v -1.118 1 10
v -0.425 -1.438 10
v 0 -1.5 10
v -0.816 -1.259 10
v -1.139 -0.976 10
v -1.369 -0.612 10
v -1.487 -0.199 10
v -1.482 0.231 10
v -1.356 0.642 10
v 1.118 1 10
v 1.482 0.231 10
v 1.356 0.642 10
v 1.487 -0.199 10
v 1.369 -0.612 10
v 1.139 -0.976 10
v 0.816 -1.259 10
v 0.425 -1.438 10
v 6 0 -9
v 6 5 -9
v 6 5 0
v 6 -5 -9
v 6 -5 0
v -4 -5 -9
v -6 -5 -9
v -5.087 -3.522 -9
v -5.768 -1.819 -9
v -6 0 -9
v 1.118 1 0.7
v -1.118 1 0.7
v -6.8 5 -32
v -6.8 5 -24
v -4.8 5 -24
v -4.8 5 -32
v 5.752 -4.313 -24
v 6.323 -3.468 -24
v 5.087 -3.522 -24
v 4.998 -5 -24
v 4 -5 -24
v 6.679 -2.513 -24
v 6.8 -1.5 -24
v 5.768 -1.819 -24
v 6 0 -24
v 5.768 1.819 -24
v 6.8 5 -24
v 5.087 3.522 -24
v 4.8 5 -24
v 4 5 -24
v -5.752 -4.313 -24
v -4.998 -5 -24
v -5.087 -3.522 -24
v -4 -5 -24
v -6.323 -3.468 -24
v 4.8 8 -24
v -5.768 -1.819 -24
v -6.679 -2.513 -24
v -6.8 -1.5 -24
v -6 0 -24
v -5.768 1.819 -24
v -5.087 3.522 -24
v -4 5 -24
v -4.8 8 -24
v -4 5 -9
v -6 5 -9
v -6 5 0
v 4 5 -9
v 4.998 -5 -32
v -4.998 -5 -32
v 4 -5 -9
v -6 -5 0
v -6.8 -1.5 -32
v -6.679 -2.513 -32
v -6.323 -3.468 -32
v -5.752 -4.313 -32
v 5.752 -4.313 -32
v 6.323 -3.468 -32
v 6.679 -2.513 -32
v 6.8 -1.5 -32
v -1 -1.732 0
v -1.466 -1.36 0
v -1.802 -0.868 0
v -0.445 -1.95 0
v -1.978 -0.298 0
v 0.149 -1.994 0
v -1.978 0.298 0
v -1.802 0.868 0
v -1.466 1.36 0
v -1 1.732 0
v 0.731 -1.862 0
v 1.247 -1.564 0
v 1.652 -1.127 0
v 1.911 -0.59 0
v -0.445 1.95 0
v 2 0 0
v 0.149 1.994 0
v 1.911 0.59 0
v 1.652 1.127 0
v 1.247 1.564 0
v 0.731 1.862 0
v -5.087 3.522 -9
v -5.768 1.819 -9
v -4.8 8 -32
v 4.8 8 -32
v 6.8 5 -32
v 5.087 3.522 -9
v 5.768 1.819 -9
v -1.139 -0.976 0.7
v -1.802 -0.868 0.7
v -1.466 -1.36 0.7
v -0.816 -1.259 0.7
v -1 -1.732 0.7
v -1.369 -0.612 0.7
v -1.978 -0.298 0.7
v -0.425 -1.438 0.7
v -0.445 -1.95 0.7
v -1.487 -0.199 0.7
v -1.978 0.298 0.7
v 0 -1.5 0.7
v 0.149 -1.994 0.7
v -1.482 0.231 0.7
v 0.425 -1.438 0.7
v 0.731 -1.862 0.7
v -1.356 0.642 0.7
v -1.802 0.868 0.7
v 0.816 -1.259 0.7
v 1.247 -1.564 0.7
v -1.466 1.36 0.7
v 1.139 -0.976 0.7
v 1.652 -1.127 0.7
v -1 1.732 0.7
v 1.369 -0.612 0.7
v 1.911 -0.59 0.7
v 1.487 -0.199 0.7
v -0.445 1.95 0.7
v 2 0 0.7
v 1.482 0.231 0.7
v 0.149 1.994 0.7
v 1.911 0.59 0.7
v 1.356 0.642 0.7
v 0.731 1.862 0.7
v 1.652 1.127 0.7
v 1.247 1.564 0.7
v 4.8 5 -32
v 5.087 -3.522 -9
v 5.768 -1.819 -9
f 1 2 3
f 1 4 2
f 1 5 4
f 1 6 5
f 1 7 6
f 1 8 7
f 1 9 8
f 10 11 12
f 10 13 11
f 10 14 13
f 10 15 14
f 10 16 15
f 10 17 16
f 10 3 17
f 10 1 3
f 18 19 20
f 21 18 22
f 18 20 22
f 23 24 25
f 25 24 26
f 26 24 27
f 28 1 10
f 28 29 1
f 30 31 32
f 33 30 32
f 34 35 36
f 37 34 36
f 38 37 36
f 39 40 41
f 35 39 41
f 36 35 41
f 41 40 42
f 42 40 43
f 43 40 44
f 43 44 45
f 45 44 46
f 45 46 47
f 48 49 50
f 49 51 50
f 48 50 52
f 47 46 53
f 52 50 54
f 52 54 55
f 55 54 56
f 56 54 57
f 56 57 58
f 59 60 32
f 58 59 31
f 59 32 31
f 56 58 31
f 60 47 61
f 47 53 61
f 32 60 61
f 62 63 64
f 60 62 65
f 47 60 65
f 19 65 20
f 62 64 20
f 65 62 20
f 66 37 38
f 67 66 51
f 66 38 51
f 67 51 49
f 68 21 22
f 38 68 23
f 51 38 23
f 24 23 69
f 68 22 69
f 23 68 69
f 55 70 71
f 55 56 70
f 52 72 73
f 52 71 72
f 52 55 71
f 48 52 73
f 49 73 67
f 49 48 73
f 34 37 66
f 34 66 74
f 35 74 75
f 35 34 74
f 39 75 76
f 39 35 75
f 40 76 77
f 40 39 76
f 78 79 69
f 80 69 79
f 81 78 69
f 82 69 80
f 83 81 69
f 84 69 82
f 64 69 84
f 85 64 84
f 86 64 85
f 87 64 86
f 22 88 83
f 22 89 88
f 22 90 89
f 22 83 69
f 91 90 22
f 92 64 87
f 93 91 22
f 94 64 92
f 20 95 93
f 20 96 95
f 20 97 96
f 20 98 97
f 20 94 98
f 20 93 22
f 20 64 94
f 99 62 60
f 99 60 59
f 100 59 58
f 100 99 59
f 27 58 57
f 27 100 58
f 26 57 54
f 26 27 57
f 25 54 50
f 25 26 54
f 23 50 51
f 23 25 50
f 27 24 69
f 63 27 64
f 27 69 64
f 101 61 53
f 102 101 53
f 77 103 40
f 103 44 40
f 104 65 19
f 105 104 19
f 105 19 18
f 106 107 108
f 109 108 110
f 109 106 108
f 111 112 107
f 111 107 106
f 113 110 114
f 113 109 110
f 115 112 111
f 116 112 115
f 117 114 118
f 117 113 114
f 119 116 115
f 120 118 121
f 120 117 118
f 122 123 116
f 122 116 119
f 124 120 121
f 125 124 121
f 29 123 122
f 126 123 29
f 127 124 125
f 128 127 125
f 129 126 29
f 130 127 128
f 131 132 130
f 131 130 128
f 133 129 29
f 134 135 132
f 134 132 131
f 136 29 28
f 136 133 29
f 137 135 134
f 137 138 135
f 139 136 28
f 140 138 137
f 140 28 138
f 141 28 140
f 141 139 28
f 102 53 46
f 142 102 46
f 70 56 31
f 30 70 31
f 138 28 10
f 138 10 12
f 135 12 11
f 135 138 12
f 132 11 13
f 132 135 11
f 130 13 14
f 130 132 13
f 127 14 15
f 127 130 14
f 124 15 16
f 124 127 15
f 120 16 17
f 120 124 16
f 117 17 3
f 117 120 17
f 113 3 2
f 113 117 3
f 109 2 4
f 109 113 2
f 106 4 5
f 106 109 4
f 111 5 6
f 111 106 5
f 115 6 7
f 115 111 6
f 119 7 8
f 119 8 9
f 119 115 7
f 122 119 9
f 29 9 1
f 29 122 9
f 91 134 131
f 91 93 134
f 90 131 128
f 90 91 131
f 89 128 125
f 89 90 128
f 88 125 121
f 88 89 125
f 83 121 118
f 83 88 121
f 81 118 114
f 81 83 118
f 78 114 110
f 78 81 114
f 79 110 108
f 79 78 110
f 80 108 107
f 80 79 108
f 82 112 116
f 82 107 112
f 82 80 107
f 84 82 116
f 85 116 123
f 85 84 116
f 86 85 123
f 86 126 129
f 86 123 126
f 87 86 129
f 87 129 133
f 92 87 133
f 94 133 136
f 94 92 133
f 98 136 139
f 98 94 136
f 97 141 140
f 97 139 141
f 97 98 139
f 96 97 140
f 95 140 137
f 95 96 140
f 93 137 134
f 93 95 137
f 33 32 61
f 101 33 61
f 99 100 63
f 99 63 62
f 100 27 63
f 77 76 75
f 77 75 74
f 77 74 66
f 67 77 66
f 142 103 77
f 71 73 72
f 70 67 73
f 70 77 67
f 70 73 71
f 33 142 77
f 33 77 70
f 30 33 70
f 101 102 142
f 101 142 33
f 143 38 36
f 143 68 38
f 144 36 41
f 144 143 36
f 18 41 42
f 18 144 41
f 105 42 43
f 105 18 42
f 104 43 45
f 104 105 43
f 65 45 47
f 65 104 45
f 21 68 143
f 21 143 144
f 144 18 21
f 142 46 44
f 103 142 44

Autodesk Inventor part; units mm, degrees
ref_plane "YZ Plane" through (0, 0, 0) normal (1, 0, 0) x (0, 1, 0)
ref_plane "XZ Plane" through (0, 0, 0) normal (0, 1, 0) x (-1, 0, 0)
ref_plane "XY Plane" through (0, 0, 0) normal (0, 0, 1) x (1, 0, 0)
sketch "スケッチ1" plane through (0, 0, 0) normal (0, 0, 1) x (1, 0, 0)
  line L0 (-6, 5) -> (6, 5)
  line L1 (6, 5) -> (6, -5)
  line L2 (6, -5) -> (-6, -5)
  line L3 (-6, -5) -> (-6, 5)
  point P0 (0, 0)
  point P1 (0, -5)
  point P2 (6, 0)
  dimension "d0" = 12
  dimension "d1" = 10
extrude "ギヤボックス" add sketch "スケッチ1" against normal blind 9
sketch "スケッチ2" plane through (0, 0, 0) normal (0, 0, 1) x (1, 0, 0)
  circle A0 centre (0, 0) radius 1.5
  line L0 (-1.118, 1) -> (1.118, 1)
  circle A1 centre (0, 0) radius 2
  dimension "d4" = 3
  dimension "d5" = 1
  dimension "d6" = 4
extrude "軸受け" add sketch "スケッチ2" along normal blind 0.7 contours A0 L0 | L0 A0 | A1
extrude "軸" add sketch "スケッチ2" along normal blind 10 contours A0 L0 picked at (0.0594, 0.1702)
sketch "スケッチ3" plane through (0, 0, -9) normal (0, 0, -1) x (-1, 0, 0)
  line L0 (6, 5) -> (-6, 5) projected
  line L1 (-6, -5) -> (6, -5) projected
  line L2 (-4, 5) -> (4, 5)
  line L3 (4, 5) -> (4, -5)
  line L4 (4, -5) -> (-4, -5)
  line L5 (-4, -5) -> (-4, 5)
  arc A0 (-4, 5) -> (-4, -5) centre (1.25, 0) ccw
  arc A1 (4, -5) -> (4, 5) centre (-1.25, 0) ccw
  line L6 (-6, 5) -> (-6, -5) projected
  line L7 (6, -5) -> (6, 5) projected
  line L8 (0, 7.0621) -> (0, -7.0621) construction
  line L9 (-6, 7.0625) -> (-6, -7.0625) construction
  line L10 (6, -7.0752) -> (6, 7.0489) construction
  point P0 (0, 0)
  point P1 (0, 5)
  point P2 (0, 0)
  point P3 (4, 5)
  point P4 (-4, -5)
  dimension "d11" = 8
  dimension "d15" = 12
extrude "モーター" add sketch "スケッチ3" along normal blind 15 contours L3 L1 L5 L0 | A1 L3 | L5 A0
sketch "スケッチ4" plane through (0, 0, -24) normal (0, 0, -1) x (-1, 0, 0)
  line L0 (-6.8, -5) -> (6.8, -5)
  line L1 (6.8, -5) -> (6.8, 5)
  line L2 (6.8, 5) -> (-6.8, 5)
  line L3 (-6.8, 5) -> (-6.8, -5)
  arc A0 (-6.8, -1.5) -> (-4.998, -5) centre (-2.5, -1.5) ccw
  arc A1 (4.998, -5) -> (6.8, -1.5) centre (2.5, -1.5) ccw
  line L4 (-4, -5) -> (4, -5) projected
  line L5 (0, 7.2835) -> (0, -7.2835) construction
  line L6 (-4.8, 5) -> (4.8, 5)
  line L7 (4.8, 5) -> (4.8, 8)
  line L8 (4.8, 8) -> (-4.8, 8)
  line L9 (-4.8, 8) -> (-4.8, 5)
  line L10 (4, 5) -> (-4, 5) projected
  point P0 (0, 0)
  point P1 (0, -5)
  point P2 (0, 0)
  point P3 (0, 8)
  dimension "d16" = 13.6
  dimension "d17" = 9.6
  dimension "d18" = 13
  dimension "d19" = 3.5
  dimension "d20" = 2.5
extrude "エンコーダ" add sketch "スケッチ4" along normal blind 8 contours A0 L3 L2 L1 A1 L0 | L9 L8 L7 L2
properties part number "MercuryN20"
